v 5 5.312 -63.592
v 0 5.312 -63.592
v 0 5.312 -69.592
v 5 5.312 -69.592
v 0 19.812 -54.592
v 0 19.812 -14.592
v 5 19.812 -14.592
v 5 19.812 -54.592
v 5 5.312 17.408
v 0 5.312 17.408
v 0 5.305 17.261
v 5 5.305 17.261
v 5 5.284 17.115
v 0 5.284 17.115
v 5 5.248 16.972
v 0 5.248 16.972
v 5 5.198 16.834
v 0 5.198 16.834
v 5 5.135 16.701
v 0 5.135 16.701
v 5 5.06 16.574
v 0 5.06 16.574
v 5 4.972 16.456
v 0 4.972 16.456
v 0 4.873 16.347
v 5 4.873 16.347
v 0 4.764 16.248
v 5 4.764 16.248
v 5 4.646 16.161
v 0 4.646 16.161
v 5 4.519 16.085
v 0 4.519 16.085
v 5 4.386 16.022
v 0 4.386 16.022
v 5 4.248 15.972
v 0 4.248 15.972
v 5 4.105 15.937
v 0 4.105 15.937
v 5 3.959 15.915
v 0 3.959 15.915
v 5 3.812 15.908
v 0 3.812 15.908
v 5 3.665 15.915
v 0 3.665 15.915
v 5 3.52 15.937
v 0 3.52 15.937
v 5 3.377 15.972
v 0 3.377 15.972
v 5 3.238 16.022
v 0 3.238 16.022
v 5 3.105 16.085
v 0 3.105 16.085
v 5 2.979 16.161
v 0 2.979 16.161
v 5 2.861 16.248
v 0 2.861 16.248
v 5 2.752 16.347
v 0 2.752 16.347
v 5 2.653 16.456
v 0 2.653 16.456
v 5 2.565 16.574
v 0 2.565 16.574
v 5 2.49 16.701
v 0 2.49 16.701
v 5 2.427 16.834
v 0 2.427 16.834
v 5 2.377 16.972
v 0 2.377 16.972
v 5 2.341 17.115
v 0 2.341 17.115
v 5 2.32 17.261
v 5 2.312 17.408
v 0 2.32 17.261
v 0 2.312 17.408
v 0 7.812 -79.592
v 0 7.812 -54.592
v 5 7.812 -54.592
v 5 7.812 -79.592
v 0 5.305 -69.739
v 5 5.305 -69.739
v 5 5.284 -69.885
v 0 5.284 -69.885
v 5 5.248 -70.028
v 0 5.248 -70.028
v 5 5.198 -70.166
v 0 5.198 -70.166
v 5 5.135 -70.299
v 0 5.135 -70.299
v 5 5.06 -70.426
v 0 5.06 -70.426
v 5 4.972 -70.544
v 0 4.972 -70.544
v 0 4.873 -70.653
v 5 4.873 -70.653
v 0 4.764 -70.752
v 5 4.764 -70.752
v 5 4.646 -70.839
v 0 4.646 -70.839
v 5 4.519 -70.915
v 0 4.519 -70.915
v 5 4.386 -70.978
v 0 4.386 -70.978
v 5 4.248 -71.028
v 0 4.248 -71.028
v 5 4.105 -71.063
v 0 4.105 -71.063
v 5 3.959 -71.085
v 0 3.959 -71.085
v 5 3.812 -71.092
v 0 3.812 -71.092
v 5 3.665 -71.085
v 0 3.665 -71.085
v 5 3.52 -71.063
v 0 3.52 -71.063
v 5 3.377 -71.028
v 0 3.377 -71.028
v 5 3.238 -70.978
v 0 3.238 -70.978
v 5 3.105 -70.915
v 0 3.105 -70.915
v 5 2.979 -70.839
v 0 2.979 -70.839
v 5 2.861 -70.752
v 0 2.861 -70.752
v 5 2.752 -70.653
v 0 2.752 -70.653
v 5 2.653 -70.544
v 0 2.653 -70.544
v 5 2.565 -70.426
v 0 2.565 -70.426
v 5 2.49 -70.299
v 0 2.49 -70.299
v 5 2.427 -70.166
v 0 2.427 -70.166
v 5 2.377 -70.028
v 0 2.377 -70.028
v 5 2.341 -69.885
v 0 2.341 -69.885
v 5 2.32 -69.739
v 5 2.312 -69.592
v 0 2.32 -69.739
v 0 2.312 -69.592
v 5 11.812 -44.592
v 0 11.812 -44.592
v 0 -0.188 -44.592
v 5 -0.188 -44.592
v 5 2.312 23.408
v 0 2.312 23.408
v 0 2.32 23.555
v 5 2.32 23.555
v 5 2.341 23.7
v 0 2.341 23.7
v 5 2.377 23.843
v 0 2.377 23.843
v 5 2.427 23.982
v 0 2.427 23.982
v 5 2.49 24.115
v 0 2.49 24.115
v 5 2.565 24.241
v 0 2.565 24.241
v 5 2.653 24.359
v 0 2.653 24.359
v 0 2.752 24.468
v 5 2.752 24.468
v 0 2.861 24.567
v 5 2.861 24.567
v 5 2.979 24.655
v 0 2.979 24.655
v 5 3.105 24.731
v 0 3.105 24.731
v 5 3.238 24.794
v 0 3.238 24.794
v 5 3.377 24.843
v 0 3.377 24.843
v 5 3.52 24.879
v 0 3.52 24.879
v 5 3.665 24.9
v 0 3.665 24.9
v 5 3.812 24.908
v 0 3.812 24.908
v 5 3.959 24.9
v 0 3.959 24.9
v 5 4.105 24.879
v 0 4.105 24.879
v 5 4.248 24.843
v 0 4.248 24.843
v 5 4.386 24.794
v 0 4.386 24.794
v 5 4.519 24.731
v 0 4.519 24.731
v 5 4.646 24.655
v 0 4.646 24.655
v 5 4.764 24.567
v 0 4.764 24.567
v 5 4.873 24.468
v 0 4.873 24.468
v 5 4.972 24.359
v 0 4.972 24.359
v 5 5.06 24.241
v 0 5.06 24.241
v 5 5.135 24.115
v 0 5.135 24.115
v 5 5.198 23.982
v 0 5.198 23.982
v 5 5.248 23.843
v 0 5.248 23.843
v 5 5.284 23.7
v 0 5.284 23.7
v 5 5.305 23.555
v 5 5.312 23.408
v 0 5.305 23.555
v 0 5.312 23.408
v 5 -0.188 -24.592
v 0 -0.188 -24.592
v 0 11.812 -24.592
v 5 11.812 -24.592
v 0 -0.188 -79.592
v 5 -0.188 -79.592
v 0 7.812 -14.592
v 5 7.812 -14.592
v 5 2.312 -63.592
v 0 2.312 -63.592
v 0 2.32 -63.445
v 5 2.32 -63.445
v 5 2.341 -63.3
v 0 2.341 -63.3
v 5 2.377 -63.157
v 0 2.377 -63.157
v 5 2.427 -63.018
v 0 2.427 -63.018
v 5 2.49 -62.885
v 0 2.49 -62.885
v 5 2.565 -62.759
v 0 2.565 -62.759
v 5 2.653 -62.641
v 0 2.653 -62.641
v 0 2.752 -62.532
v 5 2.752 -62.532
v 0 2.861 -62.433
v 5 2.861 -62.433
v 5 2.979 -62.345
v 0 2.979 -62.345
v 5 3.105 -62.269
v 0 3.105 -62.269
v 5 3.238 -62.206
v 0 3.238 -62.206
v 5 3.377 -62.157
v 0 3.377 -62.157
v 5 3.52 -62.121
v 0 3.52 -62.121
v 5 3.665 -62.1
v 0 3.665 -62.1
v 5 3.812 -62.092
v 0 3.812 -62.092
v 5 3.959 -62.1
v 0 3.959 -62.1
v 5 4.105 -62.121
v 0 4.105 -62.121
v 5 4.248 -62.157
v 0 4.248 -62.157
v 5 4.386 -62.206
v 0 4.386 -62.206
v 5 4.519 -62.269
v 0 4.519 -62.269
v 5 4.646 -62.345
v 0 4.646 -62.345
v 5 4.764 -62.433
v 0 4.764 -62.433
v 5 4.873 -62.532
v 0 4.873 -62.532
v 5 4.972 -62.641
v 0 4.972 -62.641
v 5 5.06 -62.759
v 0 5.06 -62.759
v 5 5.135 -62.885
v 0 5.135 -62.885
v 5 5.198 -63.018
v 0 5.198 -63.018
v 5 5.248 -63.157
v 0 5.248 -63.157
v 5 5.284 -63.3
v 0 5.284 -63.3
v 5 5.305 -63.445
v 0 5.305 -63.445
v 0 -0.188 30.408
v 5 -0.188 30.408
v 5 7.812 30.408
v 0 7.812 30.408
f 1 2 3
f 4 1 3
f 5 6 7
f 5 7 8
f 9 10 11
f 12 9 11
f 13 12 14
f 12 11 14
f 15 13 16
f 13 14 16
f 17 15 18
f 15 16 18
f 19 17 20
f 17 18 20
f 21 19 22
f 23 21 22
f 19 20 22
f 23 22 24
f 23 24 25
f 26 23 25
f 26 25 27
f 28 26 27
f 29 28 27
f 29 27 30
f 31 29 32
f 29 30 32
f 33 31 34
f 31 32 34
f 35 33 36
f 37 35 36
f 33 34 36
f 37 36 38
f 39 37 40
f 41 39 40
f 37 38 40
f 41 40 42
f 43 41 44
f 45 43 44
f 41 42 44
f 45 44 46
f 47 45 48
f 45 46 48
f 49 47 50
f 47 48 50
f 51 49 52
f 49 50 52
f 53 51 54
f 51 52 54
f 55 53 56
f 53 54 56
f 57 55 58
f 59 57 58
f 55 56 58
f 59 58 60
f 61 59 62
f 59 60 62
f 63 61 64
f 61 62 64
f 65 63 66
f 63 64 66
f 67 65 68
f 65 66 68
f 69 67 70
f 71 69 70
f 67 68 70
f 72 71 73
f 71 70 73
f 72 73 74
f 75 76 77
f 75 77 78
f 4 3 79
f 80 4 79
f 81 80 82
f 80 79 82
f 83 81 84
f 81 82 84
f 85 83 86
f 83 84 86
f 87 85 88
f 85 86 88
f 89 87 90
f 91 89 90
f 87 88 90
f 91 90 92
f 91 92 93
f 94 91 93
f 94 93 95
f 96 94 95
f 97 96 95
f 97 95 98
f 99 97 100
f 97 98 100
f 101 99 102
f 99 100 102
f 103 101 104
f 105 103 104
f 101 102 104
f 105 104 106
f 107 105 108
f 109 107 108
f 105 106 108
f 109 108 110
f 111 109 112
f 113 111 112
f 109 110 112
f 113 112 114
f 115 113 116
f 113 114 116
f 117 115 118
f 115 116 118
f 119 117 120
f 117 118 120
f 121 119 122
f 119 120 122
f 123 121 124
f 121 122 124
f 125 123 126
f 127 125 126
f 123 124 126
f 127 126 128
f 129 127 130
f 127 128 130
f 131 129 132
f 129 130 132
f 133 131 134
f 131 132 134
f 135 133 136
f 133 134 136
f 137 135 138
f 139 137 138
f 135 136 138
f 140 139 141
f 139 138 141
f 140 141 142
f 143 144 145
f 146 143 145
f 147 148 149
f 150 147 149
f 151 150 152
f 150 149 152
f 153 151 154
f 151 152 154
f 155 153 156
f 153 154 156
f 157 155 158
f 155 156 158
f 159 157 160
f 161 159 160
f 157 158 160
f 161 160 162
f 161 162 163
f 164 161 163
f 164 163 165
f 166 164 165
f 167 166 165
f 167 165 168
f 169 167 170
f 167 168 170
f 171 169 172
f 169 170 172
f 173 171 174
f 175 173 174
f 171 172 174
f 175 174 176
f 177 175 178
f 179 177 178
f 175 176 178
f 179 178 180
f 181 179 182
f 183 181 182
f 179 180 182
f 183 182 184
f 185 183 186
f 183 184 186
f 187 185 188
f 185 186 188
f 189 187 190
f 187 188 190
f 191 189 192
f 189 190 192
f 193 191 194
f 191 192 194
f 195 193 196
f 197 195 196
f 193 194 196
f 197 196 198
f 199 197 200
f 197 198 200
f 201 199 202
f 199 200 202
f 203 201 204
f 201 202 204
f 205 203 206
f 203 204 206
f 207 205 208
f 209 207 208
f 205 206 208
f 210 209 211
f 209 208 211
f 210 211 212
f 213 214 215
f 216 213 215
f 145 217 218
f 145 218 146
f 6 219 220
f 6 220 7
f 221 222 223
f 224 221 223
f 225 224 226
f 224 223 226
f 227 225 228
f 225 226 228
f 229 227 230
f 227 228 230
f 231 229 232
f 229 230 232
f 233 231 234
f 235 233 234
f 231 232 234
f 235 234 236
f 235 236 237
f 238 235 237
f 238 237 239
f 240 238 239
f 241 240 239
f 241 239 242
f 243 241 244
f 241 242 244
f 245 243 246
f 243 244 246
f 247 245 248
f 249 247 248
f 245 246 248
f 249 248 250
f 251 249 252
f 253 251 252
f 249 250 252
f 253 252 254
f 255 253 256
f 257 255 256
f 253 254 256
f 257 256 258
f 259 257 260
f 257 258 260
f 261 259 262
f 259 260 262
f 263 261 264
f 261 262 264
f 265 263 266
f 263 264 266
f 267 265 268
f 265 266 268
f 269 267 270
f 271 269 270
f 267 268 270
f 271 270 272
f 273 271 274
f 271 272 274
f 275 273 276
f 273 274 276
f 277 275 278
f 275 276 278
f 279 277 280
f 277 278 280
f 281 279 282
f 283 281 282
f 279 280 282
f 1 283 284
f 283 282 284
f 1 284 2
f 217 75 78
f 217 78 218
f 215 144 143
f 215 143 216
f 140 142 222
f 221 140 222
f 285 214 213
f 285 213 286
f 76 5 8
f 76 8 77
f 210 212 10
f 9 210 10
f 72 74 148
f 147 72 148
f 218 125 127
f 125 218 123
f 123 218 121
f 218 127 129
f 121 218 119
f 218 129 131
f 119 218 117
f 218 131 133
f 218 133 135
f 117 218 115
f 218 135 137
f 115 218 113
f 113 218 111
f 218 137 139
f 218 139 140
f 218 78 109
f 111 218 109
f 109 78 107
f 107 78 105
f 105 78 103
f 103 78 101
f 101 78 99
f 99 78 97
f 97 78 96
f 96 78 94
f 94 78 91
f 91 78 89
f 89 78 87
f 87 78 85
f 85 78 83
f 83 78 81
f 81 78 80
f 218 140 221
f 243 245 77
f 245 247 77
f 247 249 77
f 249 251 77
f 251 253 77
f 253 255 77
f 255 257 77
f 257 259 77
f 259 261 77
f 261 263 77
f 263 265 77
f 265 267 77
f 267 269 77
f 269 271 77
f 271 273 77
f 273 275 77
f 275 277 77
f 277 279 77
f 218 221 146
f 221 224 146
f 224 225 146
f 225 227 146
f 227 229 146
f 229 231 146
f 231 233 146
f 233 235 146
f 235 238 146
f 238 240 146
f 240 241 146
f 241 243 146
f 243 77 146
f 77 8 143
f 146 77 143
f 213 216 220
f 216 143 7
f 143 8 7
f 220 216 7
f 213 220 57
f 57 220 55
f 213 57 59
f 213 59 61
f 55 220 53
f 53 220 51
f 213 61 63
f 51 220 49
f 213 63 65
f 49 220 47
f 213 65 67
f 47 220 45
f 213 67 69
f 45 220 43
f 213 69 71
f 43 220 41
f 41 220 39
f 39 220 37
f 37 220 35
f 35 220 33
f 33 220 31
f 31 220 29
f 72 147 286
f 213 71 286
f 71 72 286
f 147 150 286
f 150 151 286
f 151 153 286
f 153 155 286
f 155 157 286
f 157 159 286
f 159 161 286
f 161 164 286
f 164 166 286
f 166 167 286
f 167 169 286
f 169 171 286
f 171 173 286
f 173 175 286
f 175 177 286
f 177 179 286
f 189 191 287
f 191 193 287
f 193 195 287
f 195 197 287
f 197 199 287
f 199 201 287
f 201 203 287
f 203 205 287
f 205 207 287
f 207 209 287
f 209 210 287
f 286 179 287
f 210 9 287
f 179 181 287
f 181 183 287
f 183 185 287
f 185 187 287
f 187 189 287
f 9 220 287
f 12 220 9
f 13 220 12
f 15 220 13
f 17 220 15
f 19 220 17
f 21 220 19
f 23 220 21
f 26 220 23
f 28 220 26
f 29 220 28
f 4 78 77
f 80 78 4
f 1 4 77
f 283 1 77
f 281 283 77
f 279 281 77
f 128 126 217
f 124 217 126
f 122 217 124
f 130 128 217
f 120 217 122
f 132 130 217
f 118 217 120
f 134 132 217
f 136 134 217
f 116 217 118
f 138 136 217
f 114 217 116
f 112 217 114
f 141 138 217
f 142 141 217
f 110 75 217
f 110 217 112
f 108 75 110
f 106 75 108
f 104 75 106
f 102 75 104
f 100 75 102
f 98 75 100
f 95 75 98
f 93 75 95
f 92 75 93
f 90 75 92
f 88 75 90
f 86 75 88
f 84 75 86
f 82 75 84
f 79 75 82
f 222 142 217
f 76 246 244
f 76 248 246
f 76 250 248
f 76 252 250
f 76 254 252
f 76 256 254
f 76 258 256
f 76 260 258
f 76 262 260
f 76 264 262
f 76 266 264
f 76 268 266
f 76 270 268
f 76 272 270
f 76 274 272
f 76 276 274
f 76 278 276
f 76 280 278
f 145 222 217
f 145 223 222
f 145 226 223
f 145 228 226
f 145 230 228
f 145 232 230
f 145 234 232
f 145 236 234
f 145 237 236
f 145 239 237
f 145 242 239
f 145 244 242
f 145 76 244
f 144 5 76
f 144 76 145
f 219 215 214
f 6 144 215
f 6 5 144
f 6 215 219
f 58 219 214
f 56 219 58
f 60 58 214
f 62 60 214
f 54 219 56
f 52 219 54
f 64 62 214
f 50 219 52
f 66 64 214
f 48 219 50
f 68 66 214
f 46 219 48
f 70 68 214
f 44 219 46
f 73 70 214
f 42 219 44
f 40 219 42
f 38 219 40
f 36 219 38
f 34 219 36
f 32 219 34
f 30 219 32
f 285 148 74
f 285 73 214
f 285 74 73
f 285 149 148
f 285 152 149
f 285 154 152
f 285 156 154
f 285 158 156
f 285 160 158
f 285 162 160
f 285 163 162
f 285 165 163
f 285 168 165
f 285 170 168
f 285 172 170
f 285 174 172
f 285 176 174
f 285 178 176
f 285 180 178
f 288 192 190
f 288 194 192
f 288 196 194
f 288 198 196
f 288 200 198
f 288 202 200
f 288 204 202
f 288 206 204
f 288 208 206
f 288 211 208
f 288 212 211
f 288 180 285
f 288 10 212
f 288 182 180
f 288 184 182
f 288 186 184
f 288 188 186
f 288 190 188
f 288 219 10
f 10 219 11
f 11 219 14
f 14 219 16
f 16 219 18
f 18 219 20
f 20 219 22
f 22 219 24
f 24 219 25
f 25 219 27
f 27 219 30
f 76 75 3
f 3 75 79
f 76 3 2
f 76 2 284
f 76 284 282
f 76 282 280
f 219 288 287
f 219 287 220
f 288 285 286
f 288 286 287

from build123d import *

# Parameters (mm, degrees)
EXTRUDE_1_DEPTH = 5


with BuildPart() as part:
    # 草图1 → 凸台-拉伸1 (new body)
    with BuildSketch(Plane(origin=(0, 0, 0), x_dir=(0, 0, -1), z_dir=(1, 0, 0))):
        Polygon((-30.407718659, 7.81238306), (14.592281341, 7.81238306), (14.592281341, 19.81238306), (54.592281341, 19.81238306), (54.592281341, 7.81238306), (79.592281341, 7.81238306), (79.592281341, -0.18761694), (44.592281341, -0.18761694), (44.592281341, 7.81238306), (44.592281341, 11.81238306), (24.592281341, 11.81238306), (24.592281341, 3.81238306), (24.592281341, -0.18761694), (-30.407718659, -0.18761694), align=None)
        with BuildLine():
            Line((-23.407718659, 5.31238306), (-17.407718659, 5.31238306))
            ThreePointArc((-17.407718659, 5.31238306), (-15.907718659, 3.81238306), (-17.407718659, 2.31238306))
            Line((-17.407718659, 2.31238306), (-23.407718659, 2.31238306))
            ThreePointArc((-23.407718659, 2.31238306), (-24.907718659, 3.81238306), (-23.407718659, 5.31238306))
        make_face(mode=Mode.SUBTRACT)
        with BuildLine():
            Line((69.592281341, 2.31238306), (63.592281341, 2.31238306))
            ThreePointArc((63.592281341, 2.31238306), (62.092281341, 3.81238306), (63.592281341, 5.31238306))
            Line((63.592281341, 5.31238306), (69.592281341, 5.31238306))
            ThreePointArc((69.592281341, 5.31238306), (71.092281341, 3.81238306), (69.592281341, 2.31238306))
        make_face(mode=Mode.SUBTRACT)
    extrude(amount=EXTRUDE_1_DEPTH)


solid = part.part
